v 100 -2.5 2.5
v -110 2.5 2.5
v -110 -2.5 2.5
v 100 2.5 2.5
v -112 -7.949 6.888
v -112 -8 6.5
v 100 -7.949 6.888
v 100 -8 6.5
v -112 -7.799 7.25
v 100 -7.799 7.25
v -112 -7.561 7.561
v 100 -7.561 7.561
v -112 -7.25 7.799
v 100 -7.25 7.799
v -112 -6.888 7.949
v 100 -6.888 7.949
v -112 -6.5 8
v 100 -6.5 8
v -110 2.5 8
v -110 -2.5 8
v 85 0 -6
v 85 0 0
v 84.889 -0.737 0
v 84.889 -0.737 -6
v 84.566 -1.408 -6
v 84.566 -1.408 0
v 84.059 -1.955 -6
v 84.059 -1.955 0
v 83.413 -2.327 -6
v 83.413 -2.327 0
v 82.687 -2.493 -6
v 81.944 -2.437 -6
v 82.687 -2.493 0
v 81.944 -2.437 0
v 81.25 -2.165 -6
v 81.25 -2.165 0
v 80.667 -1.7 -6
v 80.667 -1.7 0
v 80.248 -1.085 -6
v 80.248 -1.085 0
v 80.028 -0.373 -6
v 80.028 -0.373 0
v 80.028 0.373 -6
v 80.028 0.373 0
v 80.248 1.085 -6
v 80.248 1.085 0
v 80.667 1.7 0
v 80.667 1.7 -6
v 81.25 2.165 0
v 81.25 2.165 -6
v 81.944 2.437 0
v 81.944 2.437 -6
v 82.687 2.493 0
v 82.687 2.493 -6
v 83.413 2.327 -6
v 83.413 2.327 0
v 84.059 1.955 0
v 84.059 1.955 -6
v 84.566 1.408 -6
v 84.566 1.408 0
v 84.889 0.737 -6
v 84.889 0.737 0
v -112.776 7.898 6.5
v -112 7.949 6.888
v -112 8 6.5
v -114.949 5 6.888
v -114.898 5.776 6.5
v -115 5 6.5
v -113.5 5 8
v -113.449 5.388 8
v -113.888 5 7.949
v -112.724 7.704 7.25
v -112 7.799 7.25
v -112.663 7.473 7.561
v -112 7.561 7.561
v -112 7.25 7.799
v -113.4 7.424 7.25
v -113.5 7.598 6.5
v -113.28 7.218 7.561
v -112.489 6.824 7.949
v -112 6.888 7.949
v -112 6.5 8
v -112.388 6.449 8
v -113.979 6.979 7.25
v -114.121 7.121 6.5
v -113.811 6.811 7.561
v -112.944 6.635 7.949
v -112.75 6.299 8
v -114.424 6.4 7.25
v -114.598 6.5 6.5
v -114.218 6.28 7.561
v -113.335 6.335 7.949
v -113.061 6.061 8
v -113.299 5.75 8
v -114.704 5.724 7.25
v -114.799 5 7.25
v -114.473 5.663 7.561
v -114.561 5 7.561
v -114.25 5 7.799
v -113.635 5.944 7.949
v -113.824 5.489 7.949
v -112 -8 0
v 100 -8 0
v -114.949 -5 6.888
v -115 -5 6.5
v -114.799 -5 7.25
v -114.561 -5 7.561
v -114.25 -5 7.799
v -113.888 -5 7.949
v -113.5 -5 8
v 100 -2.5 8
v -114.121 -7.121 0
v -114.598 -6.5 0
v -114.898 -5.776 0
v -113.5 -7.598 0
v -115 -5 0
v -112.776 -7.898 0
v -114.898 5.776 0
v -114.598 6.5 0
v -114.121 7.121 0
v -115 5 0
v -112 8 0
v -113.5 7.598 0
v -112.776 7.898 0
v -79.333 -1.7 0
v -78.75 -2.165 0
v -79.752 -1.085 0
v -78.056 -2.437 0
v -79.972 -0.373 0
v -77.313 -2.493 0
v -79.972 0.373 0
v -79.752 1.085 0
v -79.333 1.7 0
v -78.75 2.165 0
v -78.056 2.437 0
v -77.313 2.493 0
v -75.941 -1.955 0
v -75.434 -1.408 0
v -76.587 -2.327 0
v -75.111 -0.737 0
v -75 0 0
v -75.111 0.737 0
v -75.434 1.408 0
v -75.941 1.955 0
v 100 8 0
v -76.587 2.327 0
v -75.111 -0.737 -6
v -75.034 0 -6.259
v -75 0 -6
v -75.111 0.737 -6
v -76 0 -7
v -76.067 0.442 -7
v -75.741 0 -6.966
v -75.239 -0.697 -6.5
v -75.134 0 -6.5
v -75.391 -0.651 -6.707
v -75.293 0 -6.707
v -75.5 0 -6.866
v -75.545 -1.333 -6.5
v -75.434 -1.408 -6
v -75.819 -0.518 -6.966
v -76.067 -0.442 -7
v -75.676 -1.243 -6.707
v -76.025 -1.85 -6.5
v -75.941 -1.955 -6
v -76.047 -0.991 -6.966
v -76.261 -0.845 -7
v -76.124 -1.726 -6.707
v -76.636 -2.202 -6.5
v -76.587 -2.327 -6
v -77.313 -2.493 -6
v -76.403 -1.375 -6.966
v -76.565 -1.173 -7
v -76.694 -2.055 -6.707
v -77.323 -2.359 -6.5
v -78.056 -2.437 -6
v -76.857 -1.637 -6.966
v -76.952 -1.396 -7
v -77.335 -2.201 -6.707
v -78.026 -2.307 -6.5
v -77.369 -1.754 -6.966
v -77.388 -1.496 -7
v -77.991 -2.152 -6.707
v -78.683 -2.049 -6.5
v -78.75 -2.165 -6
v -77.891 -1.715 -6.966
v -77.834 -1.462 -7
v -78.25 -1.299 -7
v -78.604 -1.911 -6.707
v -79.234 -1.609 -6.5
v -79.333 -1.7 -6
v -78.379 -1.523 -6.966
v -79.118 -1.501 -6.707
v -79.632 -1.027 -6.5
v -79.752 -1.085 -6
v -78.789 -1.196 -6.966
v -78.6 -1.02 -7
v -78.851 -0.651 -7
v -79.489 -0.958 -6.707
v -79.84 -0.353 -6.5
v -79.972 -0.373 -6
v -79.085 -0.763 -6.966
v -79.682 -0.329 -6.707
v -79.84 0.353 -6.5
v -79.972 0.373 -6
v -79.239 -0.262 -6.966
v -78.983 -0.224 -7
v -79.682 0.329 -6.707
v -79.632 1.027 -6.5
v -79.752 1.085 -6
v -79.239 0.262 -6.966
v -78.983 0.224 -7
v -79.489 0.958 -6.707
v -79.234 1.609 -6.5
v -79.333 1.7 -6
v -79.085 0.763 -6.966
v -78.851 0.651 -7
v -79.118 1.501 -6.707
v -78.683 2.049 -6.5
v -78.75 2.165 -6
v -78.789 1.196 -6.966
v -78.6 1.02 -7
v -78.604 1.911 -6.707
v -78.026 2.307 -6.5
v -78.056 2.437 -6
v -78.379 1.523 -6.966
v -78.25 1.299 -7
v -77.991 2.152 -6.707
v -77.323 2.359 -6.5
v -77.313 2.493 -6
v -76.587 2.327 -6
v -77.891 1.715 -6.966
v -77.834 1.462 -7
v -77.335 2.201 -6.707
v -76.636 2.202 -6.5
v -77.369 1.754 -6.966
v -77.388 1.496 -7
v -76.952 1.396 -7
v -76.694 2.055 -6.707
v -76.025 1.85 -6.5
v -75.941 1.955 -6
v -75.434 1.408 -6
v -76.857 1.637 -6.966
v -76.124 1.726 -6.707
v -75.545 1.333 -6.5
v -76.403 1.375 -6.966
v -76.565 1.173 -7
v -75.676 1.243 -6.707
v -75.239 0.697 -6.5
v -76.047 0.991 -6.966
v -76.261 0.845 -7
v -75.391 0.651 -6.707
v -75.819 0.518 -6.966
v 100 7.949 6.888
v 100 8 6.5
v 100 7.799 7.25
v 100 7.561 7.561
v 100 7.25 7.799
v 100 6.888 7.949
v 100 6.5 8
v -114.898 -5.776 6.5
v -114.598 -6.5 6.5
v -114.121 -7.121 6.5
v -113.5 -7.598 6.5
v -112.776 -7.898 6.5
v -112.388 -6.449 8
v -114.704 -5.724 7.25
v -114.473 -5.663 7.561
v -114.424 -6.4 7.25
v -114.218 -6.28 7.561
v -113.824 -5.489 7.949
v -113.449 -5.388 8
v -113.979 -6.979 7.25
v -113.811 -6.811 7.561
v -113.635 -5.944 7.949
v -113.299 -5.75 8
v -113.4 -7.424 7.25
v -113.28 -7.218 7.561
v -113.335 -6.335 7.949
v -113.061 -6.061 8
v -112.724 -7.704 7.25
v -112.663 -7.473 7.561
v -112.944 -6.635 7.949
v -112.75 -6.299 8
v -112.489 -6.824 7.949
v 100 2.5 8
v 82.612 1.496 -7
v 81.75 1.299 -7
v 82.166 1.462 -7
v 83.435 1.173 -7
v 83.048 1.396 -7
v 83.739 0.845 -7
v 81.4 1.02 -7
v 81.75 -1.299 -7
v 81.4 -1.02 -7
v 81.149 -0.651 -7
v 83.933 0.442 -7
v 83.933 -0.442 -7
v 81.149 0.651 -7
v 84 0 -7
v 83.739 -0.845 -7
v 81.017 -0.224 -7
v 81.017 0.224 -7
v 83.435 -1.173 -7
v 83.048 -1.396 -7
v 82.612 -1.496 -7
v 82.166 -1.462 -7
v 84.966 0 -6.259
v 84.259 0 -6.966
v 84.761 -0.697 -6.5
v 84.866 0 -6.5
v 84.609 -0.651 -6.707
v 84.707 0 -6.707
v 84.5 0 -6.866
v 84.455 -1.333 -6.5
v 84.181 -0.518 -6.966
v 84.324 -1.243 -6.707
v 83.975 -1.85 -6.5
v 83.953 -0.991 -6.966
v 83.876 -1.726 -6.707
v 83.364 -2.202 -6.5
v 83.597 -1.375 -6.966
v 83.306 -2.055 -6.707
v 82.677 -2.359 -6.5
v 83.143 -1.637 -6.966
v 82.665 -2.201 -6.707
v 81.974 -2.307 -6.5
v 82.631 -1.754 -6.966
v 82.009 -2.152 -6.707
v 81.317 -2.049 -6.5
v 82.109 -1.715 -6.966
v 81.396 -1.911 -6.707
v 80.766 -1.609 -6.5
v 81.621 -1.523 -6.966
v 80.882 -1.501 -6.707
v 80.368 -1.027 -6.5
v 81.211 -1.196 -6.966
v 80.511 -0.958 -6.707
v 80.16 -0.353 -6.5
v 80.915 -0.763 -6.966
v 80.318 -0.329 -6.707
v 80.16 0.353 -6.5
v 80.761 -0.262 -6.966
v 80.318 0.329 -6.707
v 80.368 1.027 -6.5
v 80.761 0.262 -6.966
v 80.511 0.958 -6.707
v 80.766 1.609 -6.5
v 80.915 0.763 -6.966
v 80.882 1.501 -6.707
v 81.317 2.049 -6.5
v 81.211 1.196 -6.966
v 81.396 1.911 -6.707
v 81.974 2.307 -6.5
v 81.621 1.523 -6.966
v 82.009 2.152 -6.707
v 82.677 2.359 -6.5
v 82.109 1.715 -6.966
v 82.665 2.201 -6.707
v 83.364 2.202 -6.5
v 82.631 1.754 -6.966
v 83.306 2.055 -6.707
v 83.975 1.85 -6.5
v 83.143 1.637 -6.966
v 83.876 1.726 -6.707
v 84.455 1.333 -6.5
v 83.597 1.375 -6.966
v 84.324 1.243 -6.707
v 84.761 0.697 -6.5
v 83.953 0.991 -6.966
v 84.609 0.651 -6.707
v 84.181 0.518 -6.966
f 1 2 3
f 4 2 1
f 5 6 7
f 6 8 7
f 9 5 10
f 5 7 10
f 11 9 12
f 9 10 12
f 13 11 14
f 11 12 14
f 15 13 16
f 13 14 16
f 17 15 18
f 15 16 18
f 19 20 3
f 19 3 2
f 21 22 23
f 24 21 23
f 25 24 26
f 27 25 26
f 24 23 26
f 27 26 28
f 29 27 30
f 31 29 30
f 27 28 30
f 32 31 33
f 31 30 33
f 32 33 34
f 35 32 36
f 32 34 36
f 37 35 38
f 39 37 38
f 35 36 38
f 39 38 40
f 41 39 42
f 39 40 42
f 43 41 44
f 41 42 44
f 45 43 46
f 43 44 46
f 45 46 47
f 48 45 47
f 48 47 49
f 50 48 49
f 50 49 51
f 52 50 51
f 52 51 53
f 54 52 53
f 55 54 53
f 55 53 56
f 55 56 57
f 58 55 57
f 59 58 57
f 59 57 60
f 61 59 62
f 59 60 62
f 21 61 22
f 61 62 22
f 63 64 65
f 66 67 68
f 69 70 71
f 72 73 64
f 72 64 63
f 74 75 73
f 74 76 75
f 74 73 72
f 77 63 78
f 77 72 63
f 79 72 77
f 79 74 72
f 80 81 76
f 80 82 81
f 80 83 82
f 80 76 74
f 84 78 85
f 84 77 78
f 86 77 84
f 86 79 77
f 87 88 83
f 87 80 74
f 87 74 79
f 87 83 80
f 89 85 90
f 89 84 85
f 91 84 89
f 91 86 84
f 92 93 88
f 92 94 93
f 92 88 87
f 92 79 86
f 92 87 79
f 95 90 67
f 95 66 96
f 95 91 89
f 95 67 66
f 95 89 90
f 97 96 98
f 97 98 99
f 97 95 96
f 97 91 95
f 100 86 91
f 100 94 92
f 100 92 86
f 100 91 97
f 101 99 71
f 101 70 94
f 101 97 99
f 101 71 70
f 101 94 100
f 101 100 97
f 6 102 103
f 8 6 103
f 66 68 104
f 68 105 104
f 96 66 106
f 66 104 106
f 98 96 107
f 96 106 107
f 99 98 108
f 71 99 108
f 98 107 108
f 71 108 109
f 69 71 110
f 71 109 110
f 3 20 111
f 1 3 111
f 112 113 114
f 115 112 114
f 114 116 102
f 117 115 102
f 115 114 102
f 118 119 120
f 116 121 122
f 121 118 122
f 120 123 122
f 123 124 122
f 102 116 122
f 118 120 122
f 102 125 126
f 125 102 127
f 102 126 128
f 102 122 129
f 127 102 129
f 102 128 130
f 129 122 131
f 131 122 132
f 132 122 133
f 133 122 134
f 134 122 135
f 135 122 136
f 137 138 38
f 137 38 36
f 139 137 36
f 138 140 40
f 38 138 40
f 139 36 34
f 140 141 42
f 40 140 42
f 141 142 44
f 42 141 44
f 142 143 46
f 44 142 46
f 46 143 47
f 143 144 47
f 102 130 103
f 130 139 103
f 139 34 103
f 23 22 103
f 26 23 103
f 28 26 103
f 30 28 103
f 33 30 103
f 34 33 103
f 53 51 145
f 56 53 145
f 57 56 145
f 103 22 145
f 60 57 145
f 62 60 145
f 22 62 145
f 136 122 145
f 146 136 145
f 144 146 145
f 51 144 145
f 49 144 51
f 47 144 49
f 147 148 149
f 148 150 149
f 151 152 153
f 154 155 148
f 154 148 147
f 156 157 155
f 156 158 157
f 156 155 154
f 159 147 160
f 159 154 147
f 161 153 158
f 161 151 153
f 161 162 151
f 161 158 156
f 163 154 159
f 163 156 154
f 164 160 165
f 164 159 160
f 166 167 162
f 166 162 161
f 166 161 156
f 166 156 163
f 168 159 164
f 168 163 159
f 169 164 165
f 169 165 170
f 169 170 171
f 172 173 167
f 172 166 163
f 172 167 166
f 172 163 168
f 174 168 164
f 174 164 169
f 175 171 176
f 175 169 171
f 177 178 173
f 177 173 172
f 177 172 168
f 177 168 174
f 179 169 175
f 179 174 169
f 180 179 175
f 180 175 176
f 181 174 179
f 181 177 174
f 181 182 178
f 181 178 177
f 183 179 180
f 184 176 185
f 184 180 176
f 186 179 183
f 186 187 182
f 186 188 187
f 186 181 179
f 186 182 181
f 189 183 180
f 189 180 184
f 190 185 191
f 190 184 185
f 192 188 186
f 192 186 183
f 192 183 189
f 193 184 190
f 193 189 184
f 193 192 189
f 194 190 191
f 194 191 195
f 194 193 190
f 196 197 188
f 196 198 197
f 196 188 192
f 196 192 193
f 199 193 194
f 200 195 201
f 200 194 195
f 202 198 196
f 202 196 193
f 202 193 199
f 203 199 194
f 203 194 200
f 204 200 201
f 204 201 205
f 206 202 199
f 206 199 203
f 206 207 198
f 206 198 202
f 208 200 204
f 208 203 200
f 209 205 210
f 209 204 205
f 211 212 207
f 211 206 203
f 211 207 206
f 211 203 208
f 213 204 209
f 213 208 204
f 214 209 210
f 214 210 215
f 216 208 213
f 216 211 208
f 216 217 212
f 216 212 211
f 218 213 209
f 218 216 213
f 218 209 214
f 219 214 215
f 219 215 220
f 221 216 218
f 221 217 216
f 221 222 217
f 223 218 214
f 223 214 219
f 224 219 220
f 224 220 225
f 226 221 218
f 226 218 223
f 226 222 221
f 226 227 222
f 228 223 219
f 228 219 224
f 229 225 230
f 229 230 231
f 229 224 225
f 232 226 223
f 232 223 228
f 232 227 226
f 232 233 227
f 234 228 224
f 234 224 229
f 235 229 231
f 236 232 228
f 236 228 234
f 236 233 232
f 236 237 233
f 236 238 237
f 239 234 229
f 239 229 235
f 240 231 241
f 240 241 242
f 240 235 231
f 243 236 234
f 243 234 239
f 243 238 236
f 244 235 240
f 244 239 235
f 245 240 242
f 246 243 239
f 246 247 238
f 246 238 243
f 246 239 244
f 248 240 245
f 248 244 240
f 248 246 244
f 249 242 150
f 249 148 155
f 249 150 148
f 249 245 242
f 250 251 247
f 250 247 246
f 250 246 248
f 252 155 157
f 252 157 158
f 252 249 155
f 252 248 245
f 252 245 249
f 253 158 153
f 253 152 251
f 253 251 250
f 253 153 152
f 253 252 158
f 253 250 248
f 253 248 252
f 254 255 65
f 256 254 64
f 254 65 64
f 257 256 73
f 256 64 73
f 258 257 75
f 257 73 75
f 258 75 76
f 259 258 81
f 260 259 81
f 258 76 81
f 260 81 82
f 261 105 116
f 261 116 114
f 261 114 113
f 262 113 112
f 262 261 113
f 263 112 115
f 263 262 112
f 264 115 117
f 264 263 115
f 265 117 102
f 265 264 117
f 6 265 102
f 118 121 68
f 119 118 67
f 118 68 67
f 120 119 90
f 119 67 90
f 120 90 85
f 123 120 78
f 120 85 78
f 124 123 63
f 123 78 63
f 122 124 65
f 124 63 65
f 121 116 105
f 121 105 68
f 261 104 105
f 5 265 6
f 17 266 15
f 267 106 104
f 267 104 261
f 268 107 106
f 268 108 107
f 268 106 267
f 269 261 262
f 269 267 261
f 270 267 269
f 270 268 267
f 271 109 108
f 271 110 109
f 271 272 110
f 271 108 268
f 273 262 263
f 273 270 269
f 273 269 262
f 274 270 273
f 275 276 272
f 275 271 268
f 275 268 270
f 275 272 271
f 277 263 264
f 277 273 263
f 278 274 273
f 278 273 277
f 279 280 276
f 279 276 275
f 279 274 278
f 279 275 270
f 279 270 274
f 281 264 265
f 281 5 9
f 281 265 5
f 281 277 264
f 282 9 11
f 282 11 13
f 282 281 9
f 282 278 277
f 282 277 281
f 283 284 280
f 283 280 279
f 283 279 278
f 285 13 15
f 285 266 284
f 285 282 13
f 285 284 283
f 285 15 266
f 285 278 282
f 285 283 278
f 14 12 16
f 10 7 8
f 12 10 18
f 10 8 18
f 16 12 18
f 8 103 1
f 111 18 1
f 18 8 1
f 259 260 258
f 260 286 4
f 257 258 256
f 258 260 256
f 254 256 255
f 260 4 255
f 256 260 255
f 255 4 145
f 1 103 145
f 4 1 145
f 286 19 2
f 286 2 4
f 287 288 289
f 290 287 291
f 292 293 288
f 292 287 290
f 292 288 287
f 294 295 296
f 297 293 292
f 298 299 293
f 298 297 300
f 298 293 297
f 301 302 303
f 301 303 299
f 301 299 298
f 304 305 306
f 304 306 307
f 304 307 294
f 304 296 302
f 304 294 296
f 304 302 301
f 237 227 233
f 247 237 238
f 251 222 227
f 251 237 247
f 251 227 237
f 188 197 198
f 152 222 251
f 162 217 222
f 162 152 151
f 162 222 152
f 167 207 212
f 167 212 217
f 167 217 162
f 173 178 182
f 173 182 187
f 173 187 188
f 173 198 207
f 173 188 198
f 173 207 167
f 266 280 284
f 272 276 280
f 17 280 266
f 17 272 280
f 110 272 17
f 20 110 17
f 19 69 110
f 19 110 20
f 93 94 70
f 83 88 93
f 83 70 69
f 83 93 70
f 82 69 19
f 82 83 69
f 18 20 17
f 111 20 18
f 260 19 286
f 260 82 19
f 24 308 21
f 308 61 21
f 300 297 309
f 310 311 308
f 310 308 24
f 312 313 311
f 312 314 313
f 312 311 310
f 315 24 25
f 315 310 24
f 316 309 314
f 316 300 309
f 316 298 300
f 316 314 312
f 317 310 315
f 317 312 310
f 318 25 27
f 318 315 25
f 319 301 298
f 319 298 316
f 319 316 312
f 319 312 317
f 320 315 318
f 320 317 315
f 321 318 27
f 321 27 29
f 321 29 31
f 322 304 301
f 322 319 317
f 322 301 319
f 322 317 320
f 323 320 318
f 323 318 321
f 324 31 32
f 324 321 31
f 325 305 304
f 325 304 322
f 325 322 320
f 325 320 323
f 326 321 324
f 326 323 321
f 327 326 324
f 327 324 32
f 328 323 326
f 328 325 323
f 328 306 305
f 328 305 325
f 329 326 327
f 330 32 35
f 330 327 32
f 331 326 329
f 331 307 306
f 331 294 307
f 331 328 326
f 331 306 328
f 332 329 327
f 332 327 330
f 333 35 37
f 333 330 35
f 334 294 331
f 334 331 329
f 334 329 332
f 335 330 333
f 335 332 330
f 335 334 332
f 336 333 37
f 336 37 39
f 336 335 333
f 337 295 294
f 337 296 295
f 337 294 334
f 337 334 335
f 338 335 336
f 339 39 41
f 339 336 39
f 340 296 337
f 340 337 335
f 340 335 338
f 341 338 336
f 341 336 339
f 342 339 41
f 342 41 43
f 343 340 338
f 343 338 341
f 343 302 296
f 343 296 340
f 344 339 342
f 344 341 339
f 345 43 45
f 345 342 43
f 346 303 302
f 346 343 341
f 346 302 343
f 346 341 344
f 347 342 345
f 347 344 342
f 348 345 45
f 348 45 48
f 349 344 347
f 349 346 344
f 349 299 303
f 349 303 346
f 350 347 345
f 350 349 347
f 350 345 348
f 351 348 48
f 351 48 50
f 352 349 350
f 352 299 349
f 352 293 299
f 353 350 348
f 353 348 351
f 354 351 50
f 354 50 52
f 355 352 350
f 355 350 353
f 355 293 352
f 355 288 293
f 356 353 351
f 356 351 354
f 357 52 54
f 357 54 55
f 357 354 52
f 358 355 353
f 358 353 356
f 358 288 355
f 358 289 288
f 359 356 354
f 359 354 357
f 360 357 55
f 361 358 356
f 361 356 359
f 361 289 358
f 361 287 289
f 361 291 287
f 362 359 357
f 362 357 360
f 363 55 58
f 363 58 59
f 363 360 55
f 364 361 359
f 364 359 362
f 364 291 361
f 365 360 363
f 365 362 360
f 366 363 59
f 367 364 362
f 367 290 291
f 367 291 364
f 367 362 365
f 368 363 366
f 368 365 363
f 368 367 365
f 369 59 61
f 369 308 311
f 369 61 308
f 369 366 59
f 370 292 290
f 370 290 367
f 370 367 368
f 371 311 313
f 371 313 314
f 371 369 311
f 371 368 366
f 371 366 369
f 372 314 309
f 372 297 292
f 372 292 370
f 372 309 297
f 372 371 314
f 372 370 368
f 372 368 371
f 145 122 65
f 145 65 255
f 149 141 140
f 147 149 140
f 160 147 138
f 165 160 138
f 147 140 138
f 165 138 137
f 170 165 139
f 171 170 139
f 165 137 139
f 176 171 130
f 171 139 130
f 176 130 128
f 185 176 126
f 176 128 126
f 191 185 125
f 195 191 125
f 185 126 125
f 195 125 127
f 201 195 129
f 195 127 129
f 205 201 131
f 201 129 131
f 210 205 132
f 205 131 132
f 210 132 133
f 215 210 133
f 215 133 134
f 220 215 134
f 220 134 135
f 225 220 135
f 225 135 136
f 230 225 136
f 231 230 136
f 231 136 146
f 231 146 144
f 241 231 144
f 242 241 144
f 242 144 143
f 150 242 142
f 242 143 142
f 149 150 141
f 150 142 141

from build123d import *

# Parameters (mm, degrees)
F0_W     = 215
F0_H     = 16
F1_DEPTH = 8
F2_R     = 2.5
F3_DEPTH = 7
F4_R     = 3
F5_R     = 1
F6_R     = 1.5
F7_W     = 210
F7_H     = 5
F8_DEPTH = 5.5


with BuildPart() as f1:
    # F0 (on Top) → F1 (new body)
    with BuildSketch(Plane.XY):
        with Locations((-7.5, 0)):
            Rectangle(F0_W, F0_H)
    extrude(amount=F1_DEPTH)

    # F2 (on face) → F3 (join)
    with BuildSketch(Plane(origin=(0, 0, 0), x_dir=(1, 0, 0), z_dir=(0, 0, -1))):
        with Locations((-77.5, 0)):
            Circle(F2_R)
        with Locations((82.5, 0)):
            Circle(F2_R)
    extrude(amount=F3_DEPTH)

    # F4
    f4_edges = [f1.edges().sort_by_distance(p)[0] for p in [
        (-115, -8, 4),
        (-115, 8, 4),
    ]]
    fillet(f4_edges, radius=F4_R)

    # F5
    f5_edges = [f1.edges().sort_by_distance(p)[0] for p in [
        (-80, 0, -7),
        (80, 0, -7),
    ]]
    fillet(f5_edges, radius=F5_R)

    # F6
    f6_edges = [f1.edges().sort_by_distance(p)[0] for p in [
        (-6, -8, 8),
    ]]
    fillet(f6_edges, radius=F6_R)

    # F7 (on face) → F8 (cut)
    with BuildSketch(Plane.XY.offset(8)):
        with Locations((-5, 0)):
            Rectangle(F7_W, F7_H)
    extrude(amount=-F8_DEPTH, mode=Mode.SUBTRACT)


solid = f1.part
